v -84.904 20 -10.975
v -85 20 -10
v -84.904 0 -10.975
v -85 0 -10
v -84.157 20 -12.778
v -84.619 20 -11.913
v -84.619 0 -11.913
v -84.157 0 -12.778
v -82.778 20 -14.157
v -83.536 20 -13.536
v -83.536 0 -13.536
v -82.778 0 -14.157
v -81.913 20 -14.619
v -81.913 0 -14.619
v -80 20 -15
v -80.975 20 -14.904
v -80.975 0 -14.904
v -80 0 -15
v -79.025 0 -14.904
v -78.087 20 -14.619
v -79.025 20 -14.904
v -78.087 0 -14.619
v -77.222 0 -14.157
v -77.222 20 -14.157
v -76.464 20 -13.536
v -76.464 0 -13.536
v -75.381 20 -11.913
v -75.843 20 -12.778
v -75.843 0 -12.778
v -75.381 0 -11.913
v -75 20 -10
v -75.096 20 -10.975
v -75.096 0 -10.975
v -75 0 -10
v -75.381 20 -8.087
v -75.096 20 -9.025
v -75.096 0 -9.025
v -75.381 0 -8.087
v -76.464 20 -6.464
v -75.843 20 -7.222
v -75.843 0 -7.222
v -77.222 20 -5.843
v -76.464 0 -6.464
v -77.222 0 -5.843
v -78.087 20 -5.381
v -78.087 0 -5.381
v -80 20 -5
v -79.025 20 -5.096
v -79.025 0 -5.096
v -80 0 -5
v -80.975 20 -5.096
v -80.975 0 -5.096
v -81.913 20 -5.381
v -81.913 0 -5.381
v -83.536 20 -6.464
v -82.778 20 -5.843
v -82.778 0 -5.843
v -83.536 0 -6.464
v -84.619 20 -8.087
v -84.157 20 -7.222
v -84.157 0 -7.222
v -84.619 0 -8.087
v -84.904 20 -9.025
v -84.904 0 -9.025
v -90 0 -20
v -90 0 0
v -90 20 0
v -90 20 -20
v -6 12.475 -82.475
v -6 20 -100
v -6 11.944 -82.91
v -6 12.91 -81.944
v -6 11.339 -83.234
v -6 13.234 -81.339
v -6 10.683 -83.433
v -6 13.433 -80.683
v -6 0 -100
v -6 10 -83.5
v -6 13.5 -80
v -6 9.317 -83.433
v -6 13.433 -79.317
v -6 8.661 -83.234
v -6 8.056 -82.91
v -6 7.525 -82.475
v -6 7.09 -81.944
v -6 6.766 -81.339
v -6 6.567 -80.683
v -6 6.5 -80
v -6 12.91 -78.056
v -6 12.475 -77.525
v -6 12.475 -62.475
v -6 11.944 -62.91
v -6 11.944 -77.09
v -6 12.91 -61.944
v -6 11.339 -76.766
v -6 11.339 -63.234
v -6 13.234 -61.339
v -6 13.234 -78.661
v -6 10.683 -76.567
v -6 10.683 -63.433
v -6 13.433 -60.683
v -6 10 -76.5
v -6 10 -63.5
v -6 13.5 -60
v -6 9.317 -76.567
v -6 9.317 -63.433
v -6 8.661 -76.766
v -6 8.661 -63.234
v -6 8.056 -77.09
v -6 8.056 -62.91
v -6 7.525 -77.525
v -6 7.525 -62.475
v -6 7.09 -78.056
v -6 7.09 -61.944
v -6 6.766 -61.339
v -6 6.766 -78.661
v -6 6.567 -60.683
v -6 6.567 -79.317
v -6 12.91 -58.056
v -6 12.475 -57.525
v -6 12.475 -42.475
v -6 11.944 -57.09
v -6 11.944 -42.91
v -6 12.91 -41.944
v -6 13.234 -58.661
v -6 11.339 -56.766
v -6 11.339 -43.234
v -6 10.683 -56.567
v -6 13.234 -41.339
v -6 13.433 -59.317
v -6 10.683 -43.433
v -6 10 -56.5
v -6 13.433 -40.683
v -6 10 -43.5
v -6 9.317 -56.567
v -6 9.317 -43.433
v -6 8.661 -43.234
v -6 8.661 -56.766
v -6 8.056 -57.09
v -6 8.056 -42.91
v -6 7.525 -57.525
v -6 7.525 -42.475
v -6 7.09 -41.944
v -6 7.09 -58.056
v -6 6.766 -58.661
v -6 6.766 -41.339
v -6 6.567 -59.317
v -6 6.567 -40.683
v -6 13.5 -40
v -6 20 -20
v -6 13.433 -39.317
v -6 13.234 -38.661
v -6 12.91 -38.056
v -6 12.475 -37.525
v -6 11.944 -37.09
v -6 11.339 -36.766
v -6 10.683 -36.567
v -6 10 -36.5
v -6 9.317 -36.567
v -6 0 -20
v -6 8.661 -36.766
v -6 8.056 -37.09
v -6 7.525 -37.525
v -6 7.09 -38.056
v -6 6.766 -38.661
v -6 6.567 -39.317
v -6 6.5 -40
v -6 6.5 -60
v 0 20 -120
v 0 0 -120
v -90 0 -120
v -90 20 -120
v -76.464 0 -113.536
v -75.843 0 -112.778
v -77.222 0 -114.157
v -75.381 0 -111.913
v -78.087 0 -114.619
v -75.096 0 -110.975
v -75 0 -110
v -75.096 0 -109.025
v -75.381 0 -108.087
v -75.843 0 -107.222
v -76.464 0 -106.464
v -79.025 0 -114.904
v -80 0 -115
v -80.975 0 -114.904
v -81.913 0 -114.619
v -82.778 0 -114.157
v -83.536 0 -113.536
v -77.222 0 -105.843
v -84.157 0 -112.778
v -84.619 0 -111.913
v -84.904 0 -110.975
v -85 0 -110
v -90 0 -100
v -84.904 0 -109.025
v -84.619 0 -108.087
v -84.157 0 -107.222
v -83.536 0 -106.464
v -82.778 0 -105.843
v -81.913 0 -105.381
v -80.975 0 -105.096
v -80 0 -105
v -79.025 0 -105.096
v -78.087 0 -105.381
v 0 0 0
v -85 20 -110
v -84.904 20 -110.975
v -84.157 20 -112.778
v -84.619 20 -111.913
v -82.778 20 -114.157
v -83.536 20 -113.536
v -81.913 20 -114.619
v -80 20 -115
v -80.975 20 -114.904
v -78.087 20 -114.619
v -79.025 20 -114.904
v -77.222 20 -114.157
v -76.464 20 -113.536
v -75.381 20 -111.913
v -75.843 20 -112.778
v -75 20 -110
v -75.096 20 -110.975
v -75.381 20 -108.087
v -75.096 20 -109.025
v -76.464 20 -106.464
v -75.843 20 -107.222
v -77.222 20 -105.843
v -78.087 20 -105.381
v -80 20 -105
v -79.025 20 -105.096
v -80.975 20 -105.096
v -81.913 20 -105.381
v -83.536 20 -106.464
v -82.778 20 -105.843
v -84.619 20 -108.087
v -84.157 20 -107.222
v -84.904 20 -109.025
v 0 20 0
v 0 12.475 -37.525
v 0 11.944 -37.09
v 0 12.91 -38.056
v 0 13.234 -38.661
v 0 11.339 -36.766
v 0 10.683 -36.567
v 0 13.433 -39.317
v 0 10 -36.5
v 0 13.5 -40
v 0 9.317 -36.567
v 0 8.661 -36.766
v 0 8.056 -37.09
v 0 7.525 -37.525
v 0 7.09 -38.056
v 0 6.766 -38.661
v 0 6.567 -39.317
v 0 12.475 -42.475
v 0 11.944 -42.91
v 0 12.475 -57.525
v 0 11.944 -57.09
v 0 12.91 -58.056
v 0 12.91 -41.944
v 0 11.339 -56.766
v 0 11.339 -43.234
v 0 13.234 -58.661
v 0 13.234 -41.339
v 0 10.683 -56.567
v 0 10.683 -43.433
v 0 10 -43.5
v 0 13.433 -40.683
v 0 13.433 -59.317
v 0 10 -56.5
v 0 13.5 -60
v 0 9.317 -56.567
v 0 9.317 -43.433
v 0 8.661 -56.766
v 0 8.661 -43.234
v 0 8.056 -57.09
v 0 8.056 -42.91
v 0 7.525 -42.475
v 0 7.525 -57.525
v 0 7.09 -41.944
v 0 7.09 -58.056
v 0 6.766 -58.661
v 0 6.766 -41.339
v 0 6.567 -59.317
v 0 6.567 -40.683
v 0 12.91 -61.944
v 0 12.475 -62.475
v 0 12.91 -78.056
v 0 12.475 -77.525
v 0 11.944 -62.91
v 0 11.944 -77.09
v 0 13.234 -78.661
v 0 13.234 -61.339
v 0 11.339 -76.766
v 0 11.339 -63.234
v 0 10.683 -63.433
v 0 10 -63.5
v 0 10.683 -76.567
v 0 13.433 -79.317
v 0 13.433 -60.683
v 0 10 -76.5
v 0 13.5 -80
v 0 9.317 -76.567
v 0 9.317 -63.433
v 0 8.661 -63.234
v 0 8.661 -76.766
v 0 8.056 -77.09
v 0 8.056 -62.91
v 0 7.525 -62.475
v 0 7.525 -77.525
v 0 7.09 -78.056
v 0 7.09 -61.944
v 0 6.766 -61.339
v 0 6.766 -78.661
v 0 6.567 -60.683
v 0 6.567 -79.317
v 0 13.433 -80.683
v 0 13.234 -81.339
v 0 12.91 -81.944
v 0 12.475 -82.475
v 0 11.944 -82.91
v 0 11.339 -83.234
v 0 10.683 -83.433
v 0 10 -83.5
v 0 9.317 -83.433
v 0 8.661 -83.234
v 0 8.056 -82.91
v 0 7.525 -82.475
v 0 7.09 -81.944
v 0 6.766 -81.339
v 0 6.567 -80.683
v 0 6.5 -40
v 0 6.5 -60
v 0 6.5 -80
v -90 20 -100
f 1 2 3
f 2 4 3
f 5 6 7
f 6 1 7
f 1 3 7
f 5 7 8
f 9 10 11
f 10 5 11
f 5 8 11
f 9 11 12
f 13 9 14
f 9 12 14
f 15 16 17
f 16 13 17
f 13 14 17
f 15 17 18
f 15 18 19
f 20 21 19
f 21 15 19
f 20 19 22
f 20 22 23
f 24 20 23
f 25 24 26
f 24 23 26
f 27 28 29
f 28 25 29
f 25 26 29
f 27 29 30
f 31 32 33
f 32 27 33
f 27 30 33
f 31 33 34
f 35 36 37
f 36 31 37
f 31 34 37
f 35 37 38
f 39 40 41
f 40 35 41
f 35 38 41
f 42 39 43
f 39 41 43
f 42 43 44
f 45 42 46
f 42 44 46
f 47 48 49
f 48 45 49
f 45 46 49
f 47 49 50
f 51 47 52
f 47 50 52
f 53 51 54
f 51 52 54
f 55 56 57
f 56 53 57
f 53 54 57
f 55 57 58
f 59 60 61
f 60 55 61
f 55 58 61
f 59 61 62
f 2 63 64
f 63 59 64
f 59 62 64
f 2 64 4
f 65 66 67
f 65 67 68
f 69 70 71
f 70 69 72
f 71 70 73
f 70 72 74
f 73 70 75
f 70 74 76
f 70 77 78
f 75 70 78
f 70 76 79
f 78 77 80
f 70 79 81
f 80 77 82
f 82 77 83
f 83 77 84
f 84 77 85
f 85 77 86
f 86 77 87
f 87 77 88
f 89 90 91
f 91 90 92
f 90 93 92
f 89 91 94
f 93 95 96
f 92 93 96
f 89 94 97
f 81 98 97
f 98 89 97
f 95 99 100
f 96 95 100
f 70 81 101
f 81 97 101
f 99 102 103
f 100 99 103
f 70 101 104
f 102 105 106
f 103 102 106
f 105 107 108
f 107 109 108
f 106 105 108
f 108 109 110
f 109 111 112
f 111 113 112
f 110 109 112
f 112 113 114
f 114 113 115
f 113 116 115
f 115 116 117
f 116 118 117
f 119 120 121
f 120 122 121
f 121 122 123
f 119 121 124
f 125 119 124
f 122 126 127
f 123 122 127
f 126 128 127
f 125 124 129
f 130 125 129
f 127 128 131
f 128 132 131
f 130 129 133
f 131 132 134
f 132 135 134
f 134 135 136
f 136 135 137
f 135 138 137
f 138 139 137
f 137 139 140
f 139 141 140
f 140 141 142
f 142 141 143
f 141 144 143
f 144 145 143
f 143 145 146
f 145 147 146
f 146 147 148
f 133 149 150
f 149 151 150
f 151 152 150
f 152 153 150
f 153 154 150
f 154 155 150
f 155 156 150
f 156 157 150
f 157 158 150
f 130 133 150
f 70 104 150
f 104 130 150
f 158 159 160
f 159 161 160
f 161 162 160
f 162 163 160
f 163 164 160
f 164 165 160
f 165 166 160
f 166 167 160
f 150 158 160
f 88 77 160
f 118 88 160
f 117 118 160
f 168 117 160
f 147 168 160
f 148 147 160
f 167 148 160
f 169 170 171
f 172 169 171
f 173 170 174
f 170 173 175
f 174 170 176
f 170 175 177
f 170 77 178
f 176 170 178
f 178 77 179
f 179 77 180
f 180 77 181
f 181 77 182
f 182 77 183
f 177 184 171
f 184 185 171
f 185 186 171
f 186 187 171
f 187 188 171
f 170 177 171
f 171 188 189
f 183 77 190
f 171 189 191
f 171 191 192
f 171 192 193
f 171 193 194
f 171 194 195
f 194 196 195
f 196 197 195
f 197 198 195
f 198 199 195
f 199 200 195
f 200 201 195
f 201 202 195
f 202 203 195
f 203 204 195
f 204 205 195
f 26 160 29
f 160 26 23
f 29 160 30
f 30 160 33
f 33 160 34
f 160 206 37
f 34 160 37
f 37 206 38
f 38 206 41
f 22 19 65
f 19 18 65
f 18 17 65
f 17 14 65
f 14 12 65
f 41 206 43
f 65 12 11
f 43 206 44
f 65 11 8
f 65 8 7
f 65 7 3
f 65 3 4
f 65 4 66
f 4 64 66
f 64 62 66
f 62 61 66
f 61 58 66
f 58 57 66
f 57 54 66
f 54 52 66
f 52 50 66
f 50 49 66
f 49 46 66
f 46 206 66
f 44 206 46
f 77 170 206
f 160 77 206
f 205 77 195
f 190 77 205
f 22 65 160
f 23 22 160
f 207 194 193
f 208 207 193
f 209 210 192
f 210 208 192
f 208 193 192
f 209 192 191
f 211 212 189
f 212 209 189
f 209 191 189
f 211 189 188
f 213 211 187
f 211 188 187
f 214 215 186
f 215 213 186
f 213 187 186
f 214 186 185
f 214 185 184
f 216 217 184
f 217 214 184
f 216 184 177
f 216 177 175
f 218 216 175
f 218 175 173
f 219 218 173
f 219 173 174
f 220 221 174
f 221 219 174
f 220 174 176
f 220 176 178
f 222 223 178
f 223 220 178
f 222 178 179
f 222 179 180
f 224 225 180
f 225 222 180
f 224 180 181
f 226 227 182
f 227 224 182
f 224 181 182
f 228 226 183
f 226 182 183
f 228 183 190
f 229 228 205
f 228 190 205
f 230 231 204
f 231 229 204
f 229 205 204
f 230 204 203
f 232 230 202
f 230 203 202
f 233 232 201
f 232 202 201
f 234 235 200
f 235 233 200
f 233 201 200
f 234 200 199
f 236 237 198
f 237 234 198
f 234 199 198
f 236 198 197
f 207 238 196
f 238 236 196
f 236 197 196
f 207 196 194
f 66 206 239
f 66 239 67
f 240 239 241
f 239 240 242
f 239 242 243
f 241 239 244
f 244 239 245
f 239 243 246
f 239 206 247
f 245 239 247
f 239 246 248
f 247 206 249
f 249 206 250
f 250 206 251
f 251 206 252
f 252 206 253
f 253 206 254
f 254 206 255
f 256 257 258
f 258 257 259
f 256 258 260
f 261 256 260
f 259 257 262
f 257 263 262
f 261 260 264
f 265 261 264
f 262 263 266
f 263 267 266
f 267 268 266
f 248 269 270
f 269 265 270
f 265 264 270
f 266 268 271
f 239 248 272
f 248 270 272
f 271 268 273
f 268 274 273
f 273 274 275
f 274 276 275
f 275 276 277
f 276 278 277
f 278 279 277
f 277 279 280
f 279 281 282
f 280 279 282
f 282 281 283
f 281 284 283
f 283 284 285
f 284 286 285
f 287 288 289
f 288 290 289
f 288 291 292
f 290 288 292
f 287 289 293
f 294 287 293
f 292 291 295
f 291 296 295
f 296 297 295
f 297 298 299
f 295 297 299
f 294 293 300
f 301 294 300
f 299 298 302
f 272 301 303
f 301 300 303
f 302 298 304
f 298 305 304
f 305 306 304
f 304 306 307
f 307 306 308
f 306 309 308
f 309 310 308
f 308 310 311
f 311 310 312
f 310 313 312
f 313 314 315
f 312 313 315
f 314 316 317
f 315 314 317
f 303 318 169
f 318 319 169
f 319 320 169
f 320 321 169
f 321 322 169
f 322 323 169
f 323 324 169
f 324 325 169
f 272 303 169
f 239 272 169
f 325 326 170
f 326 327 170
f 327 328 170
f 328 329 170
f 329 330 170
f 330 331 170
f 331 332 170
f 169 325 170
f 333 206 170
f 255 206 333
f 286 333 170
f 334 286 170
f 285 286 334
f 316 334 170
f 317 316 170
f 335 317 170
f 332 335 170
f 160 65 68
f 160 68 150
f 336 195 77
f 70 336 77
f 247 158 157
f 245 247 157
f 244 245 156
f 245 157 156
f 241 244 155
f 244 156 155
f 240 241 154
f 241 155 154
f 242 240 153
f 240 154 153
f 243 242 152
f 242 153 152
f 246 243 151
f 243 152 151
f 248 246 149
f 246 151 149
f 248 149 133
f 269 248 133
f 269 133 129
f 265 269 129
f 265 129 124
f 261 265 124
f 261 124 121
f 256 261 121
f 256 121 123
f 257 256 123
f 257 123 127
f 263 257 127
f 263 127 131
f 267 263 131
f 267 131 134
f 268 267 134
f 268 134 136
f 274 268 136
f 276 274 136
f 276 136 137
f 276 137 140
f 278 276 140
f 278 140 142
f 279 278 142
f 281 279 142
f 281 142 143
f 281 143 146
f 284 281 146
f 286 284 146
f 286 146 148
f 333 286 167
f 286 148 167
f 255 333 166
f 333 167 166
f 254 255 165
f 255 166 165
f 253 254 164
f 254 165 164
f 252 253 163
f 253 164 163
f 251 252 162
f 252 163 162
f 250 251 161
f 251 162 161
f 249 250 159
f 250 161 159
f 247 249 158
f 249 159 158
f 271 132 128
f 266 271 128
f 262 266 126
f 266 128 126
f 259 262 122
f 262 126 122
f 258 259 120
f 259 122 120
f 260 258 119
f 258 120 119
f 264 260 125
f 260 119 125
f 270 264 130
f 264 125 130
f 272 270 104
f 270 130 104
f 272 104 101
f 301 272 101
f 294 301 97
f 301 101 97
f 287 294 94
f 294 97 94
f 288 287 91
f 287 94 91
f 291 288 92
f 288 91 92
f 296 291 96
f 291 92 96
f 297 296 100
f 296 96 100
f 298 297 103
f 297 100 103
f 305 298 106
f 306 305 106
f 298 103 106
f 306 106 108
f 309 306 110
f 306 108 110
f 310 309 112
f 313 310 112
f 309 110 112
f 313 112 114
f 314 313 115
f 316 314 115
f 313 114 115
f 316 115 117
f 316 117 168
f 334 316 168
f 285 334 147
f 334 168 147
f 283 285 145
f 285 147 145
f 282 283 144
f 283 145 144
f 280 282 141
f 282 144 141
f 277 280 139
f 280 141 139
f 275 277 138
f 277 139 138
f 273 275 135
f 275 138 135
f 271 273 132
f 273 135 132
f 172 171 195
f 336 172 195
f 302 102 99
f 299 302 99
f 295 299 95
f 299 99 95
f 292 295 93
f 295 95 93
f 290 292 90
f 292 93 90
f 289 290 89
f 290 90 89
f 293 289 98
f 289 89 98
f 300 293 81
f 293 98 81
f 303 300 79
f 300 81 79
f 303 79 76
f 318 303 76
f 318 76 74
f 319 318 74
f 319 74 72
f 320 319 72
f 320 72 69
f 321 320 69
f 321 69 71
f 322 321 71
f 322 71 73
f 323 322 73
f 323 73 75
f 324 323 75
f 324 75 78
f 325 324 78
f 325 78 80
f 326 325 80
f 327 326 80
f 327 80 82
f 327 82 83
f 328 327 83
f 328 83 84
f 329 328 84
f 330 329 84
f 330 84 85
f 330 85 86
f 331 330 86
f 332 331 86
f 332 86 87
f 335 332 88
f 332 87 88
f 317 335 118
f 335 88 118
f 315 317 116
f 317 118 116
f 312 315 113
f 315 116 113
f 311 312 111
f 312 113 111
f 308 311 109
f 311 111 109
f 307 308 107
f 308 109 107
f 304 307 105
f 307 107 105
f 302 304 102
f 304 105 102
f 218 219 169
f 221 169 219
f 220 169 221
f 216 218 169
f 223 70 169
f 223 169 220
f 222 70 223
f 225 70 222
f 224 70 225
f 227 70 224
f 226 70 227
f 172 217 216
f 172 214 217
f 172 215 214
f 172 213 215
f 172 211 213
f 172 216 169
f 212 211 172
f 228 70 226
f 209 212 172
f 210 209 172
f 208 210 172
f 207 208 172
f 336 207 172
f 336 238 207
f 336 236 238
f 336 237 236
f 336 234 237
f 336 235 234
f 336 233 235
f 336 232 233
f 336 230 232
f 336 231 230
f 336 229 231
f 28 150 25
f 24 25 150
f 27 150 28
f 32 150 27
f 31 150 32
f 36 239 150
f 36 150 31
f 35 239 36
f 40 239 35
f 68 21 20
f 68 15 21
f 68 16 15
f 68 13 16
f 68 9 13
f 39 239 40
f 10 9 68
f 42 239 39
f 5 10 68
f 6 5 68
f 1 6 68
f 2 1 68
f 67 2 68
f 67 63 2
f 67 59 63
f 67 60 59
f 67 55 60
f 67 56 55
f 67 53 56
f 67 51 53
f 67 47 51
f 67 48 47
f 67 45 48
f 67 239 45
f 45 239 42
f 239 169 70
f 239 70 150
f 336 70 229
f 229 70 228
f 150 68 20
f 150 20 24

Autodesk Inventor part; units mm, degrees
ref_plane "YZ Plane" through (0, 0, 0) normal (1, 0, 0) x (0, 1, 0)
ref_plane "XZ Plane" through (0, 0, 0) normal (0, 1, 0) x (-1, 0, 0)
ref_plane "XY Plane" through (0, 0, 0) normal (0, 0, 1) x (1, 0, 0)
sketch "Эскиз1" plane through (0, 0, 0) normal (0, 1, 0) x (-1, 0, 0)
  line L0 (0, 0) -> (90, 0)
  line L1 (90, 0) -> (90, -20)
  line L2 (90, -20) -> (6, -20)
  line L3 (0, 0) -> (0, -120)
  line L4 (0, -120) -> (90, -120)
  line L5 (90, -120) -> (90, -100)
  line L6 (90, -100) -> (6, -100)
  line L7 (6, -100) -> (6, -20)
  line L8 (90, 0) -> (90, -10)
  line L9 (90, -10) -> (80, -10)
  line L10 (90, -100) -> (90, -110)
  line L11 (90, -110) -> (80, -110)
  circle A0 centre (80, -10) radius 5
  circle A1 centre (80, -110) radius 5
  dimension "d4" = 90
  dimension "d5" = 20
  dimension "d6" = 84
  dimension "d7" = 120
  dimension "d8" = 20
  dimension "d9" = 10
  dimension "d10" = 10
  dimension "d11" = 10
  dimension "d12" = 10
  dimension "d13" = 10
  dimension "d14" = 10
extrude "Выдавливание1" add sketch "Эскиз1" along normal blind 20
sketch "Эскиз2" plane through (-6, 0, -100) normal (-1, 0, 0) x (0, 0, 1)
  line L0 (80, 0) -> (80, 20) projected
  line L1 (80, 0) -> (80, 10)
  line L2 (80, 10) -> (0, 10)
  line L3 (0, 0) -> (0, 20) projected
  circle A0 centre (40, 10) radius 3.5
  line L4 (40, 10) -> (60, 10)
  circle A1 centre (60, 10) radius 3.5
  line L5 (40, 10) -> (20, 10)
  circle A2 centre (20, 10) radius 3.5
  point P0 (100, 0)
  dimension "d17" = 7
  dimension "d18" = 20
  dimension "d19" = 7
  dimension "d20" = 20
  dimension "d21" = 7
extrude "Выдавливание2" cut sketch "Эскиз2" against normal blind 95.75
properties part number "Скоба для полки"
